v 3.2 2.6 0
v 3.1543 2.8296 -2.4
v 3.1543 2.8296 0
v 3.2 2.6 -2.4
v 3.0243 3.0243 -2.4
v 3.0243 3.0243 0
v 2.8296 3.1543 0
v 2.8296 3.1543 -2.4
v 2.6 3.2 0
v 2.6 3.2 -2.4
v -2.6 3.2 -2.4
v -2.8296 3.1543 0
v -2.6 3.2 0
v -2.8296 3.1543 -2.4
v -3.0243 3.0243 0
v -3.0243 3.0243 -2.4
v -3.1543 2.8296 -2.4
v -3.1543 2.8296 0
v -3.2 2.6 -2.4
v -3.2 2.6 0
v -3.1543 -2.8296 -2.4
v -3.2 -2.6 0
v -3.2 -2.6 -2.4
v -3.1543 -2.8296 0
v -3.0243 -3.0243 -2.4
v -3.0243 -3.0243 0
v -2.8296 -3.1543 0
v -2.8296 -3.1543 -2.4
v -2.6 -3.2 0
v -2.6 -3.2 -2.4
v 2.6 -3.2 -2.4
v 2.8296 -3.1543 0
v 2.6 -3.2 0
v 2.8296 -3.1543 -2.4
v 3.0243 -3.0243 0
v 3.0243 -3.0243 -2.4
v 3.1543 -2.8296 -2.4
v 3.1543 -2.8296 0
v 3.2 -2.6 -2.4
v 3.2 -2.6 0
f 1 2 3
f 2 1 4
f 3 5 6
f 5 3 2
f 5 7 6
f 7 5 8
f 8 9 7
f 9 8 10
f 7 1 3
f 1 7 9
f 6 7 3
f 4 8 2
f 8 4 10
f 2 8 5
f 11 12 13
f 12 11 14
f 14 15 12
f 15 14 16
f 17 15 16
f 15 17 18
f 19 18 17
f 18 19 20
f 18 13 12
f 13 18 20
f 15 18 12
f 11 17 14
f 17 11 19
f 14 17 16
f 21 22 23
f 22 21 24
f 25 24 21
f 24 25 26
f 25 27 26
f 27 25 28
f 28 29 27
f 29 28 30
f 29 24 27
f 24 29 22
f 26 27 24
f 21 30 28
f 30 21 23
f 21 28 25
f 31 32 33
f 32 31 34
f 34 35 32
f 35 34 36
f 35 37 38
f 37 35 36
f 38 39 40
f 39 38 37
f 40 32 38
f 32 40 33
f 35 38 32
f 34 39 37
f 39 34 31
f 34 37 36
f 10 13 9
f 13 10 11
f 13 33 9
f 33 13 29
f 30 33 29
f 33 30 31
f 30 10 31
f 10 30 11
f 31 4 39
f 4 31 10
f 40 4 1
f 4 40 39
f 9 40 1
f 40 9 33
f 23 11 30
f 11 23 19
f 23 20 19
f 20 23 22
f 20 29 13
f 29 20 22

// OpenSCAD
// file: ../p/1-4edge.scad
use <../lib.scad>
function ldraw_lib__1_4edge() = [
// 0 Circle 0.25
// 0 Name: 1-4edge.dat
// 0 Author: James Jessiman
// 0 !LDRAW_ORG Primitive UPDATE 2017-01
// 0 !LICENSE Licensed under CC BY 4.0 : see CAreadme.txt
// 
// 0 BFC CERTIFY CCW
  [0,"BFC","CERTIFY"],
  [0,"BFC","CCW"],
// 
// 0 !HISTORY 2007-06-22 [PTadmin] Header formatted for Contributor Agreement
// 0 !HISTORY 2008-07-01 [PTadmin] Official Update 2008-01
// 0 !HISTORY 2017-01-15 [Steffen] BFCed
// 0 !HISTORY 2017-12-30 [PTadmin] Official Update 2017-01
// 
// 
// 2 24 1 0 0 0.9239 0 0.3827
  [2,24,1,0,0,0.9239,0,0.3827],
// 2 24 0.9239 0 0.3827 0.7071 0 0.7071
  [2,24,0.9239,0,0.3827,0.7071,0,0.7071],
// 2 24 0.7071 0 0.7071 0.3827 0 0.9239
  [2,24,0.7071,0,0.7071,0.3827,0,0.9239],
// 2 24 0.3827 0 0.9239 0 0 1
  [2,24,0.3827,0,0.9239,0,0,1],
];
module ldraw_lib__1_4edge(step=0, col=false, unit=2/5, alt=false, line=0.2, solid=!$preview)
    makepoly(ldraw_lib__1_4edge(), step=step, col=col, unit=unit, alt=alt, line=line, solid=solid);
ldraw_lib__1_4edge(line=0.2);
// file: ../p/1-4cyli.scad
use <../lib.scad>
function ldraw_lib__1_4cyli() = [
// 0 Cylinder 0.25
// 0 Name: 1-4cyli.dat
// 0 Author: James Jessiman
// 0 !LDRAW_ORG Primitive UPDATE 2012-01
// 0 !LICENSE Licensed under CC BY 4.0 : see CAreadme.txt
// 
// 0 BFC CERTIFY CCW
  [0,"BFC","CERTIFY"],
  [0,"BFC","CCW"],
// 
// 0 !HISTORY 2002-03-23 [sbliss] Added BFC statement.
// 0 !HISTORY 2002-04-25 [PTadmin] Official Update 2002-02
// 0 !HISTORY 2007-06-22 [PTadmin] Header formatted for Contributor Agreement
// 0 !HISTORY 2008-07-01 [PTadmin] Official Update 2008-01
// 0 !HISTORY 2012-02-16 [Philo] Changed to CCW
// 0 !HISTORY 2012-03-30 [PTadmin] Official Update 2012-01
// 
// 
// 4 16 1 1 0 0.9239 1 0.3827 0.9239 0 0.3827 1 0 0
  [4,16,1,1,0,0.9239,1,0.3827,0.9239,0,0.3827,1,0,0],
// 5 24 1 0 0 1 1 0 0.9239 0 0.3827 1 0 -1
  [5,24,1,0,0,1,1,0,0.9239,0,0.3827,1,0,-1],
// 4 16 0.9239 1 0.3827 0.7071 1 0.7071 0.7071 0 0.7071 0.9239 0 0.3827
  [4,16,0.9239,1,0.3827,0.7071,1,0.7071,0.7071,0,0.7071,0.9239,0,0.3827],
// 5 24 0.9239 0 0.3827 0.9239 1 0.3827 0.7071 0 0.7071 1 0 0
  [5,24,0.9239,0,0.3827,0.9239,1,0.3827,0.7071,0,0.7071,1,0,0],
// 4 16 0.7071 1 0.7071 0.3827 1 0.9239 0.3827 0 0.9239 0.7071 0 0.7071
  [4,16,0.7071,1,0.7071,0.3827,1,0.9239,0.3827,0,0.9239,0.7071,0,0.7071],
// 5 24 0.7071 0 0.7071 0.7071 1 0.7071 0.3827 0 0.9239 0.9239 0 0.3827
  [5,24,0.7071,0,0.7071,0.7071,1,0.7071,0.3827,0,0.9239,0.9239,0,0.3827],
// 4 16 0.3827 1 0.9239 0 1 1 0 0 1 0.3827 0 0.9239
  [4,16,0.3827,1,0.9239,0,1,1,0,0,1,0.3827,0,0.9239],
// 5 24 0.3827 0 0.9239 0.3827 1 0.9239 0 0 1 0.7071 0 0.7071
  [5,24,0.3827,0,0.9239,0.3827,1,0.9239,0,0,1,0.7071,0,0.7071],
// 5 24 0 0 1 0 1 1 0.3827 0 0.9239 -1 0 1
  [5,24,0,0,1,0,1,1,0.3827,0,0.9239,-1,0,1],
];
module ldraw_lib__1_4cyli(step=0, col=false, unit=2/5, alt=false, line=0.2, solid=!$preview)
    makepoly(ldraw_lib__1_4cyli(), step=step, col=col, unit=unit, alt=alt, line=line, solid=solid);
ldraw_lib__1_4cyli(line=0.2);
// file: ../p/box4o8a.scad
use <../lib.scad>
function ldraw_lib__box4o8a() = [
// 0 Box with 4 Faces (2 Parallel Pairs) without Top and Bottom Edges
// 0 Name: box4o8a.dat
// 0 Author: Steffen [Steffen]
// 0 !LDRAW_ORG Primitive UPDATE 2012-01
// 0 !LICENSE Licensed under CC BY 4.0 : see CAreadme.txt
// 
// 0 BFC CERTIFY CCW
  [0,"BFC","CERTIFY"],
  [0,"BFC","CCW"],
// 
// 0 !HISTORY 2004-04-22 [PTadmin] Official Update 2004-02
// 0 !HISTORY 2007-06-24 [PTadmin] Header formatted for Contributor Agreement
// 0 !HISTORY 2008-07-01 [PTadmin] Official Update 2008-01
// 0 !HISTORY 2012-02-16 [Philo] Changed to CCW
// 0 !HISTORY 2012-03-30 [PTadmin] Official Update 2012-01
// 
// 
// 2 24 1 0 1 1 1 1
  [2,24,1,0,1,1,1,1],
// 2 24 -1 0 1 -1 1 1
  [2,24,-1,0,1,-1,1,1],
// 2 24 1 0 -1 1 1 -1
  [2,24,1,0,-1,1,1,-1],
// 2 24 -1 0 -1 -1 1 -1
  [2,24,-1,0,-1,-1,1,-1],
// 4 16 -1 1 1 -1 0 1 1 0 1 1 1 1
  [4,16,-1,1,1,-1,0,1,1,0,1,1,1,1],
// 4 16 -1 1 -1 -1 0 -1 -1 0 1 -1 1 1
  [4,16,-1,1,-1,-1,0,-1,-1,0,1,-1,1,1],
// 4 16 1 1 -1 1 0 -1 -1 0 -1 -1 1 -1
  [4,16,1,1,-1,1,0,-1,-1,0,-1,-1,1,-1],
// 4 16 1 1 1 1 0 1 1 0 -1 1 1 -1
  [4,16,1,1,1,1,0,1,1,0,-1,1,1,-1],
];
module ldraw_lib__box4o8a(step=0, col=false, unit=2/5, alt=false, line=0.2, solid=!$preview)
    makepoly(ldraw_lib__box4o8a(), step=step, col=col, unit=unit, alt=alt, line=line, solid=solid);
ldraw_lib__box4o8a(line=0.2);
// file: ../p/1-4cylo.scad
use <../lib.scad>
use <1-4cyli.scad>
use <1-4edge.scad>
function ldraw_lib__1_4cylo() = [
// 0 Cylinder Open 0.25
// 0 Name: 1-4cylo.dat
// 0 Author: Max Martin Richter [MMR1988]
// 0 !LDRAW_ORG Primitive UPDATE 2010-03
// 0 !LICENSE Licensed under CC BY 4.0 : see CAreadme.txt
// 
// 0 BFC CERTIFY CCW
  [0,"BFC","CERTIFY"],
  [0,"BFC","CCW"],
// 
// 0 !HISTORY 2010-12-31 [PTadmin] Official Update 2010-03
// 
// 
// 1 16 0 0 0 1 0 0 0 1 0 0 0 1 1-4edge.dat
  [1,16,0,0,0,1,0,0,0,1,0,0,0,1, ldraw_lib__1_4edge()],
// 1 16 0 1 0 1 0 0 0 1 0 0 0 1 1-4edge.dat
  [1,16,0,1,0,1,0,0,0,1,0,0,0,1, ldraw_lib__1_4edge()],
// 1 16 0 0 0 1 0 0 0 1 0 0 0 1 1-4cyli.dat
  [1,16,0,0,0,1,0,0,0,1,0,0,0,1, ldraw_lib__1_4cyli()],
];
module ldraw_lib__1_4cylo(step=0, col=false, unit=2/5, alt=false, line=0.2, solid=!$preview)
    makepoly(ldraw_lib__1_4cylo(), step=step, col=col, unit=unit, alt=alt, line=line, solid=solid);
ldraw_lib__1_4cylo(line=0.2);
// file: ../p/1-4chrd.scad
use <../lib.scad>
function ldraw_lib__1_4chrd() = [
// 0 Chord 0.25
// 0 Name: 1-4chrd.dat
// 0 Author: Tony Hafner [hafhead]
// 0 !LDRAW_ORG Primitive UPDATE 2012-02
// 0 !LICENSE Licensed under CC BY 2.0 and CC BY 4.0 : see CAreadme.txt
// 
// 0 BFC CERTIFY CCW
  [0,"BFC","CERTIFY"],
  [0,"BFC","CCW"],
// 
// 0 !HISTORY 2004-04-22 [PTadmin] Official Update 2004-02
// 0 !HISTORY 2007-10-09 [PTadmin] Header formatted for Contributor Agreement
// 0 !HISTORY 2008-07-01 [PTadmin] Official Update 2008-01
// 0 !HISTORY 2012-08-02 [MMR1988] Re-creation with PrimGen2 and Rectifier
// 0 !HISTORY 2012-08-09 [PTadmin] Official Update 2012-02
// 
// 
// 4 16 0.9239 0 0.3827 0.3827 0 0.9239 0 0 1 1 0 0
  [4,16,0.9239,0,0.3827,0.3827,0,0.9239,0,0,1,1,0,0],
// 3 16 0.7071 0 0.7071 0.3827 0 0.9239 0.9239 0 0.3827
  [3,16,0.7071,0,0.7071,0.3827,0,0.9239,0.9239,0,0.3827],
];
module ldraw_lib__1_4chrd(step=0, col=false, unit=2/5, alt=false, line=0.2, solid=!$preview)
    makepoly(ldraw_lib__1_4chrd(), step=step, col=col, unit=unit, alt=alt, line=line, solid=solid);
ldraw_lib__1_4chrd(line=0.2);
// main file
use <../lib.scad>
use <../p/1-4chrd.scad>
use <../p/1-4cylo.scad>
use <../p/box4o8a.scad>
function ldraw_lib__19068() = [
// 0 ~Electric Power Functions 2.0 Hub Button
// 0 Name: 19068.dat
// 0 Author: Philippe Hurbain [Philo]
// 0 !LDRAW_ORG Part UPDATE 2016-01
// 0 !LICENSE Licensed under CC BY 4.0 : see CAreadme.txt
// 
// 0 BFC CERTIFY CCW
  [0,"BFC","CERTIFY"],
  [0,"BFC","CCW"],
// 
// 0 !KEYWORDS WeDo 2.0
// 
// 0 !HISTORY 2016-12-31 [PTadmin] Official Update 2016-01
// 
// 
// 1 16 6.5 0 6.5 1.5 0 0 0 6 0 0 0 1.5 1-4cylo.dat
  [1,16,6.5,0,6.5,1.5,0,0,0,6,0,0,0,1.5, ldraw_lib__1_4cylo()],
// 1 16 6.5 0 6.5 1.5 0 0 0 1 0 0 0 1.5 1-4chrd.dat
  [1,16,6.5,0,6.5,1.5,0,0,0,1,0,0,0,1.5, ldraw_lib__1_4chrd()],
// 1 16 6.5 6 6.5 1.5 0 0 0 -1 0 0 0 1.5 1-4chrd.dat
  [1,16,6.5,6,6.5,1.5,0,0,0,-1,0,0,0,1.5, ldraw_lib__1_4chrd()],
// 1 16 -6.5 0 6.5 0 0 -1.5 0 6 0 1.5 0 0 1-4cylo.dat
  [1,16,-6.5,0,6.5,0,0,-1.5,0,6,0,1.5,0,0, ldraw_lib__1_4cylo()],
// 1 16 -6.5 0 6.5 0 0 -1.5 0 1 0 1.5 0 0 1-4chrd.dat
  [1,16,-6.5,0,6.5,0,0,-1.5,0,1,0,1.5,0,0, ldraw_lib__1_4chrd()],
// 1 16 -6.5 6 6.5 0 0 -1.5 0 -1 0 1.5 0 0 1-4chrd.dat
  [1,16,-6.5,6,6.5,0,0,-1.5,0,-1,0,1.5,0,0, ldraw_lib__1_4chrd()],
// 1 16 -6.5 0 -6.5 -1.5 0 0 0 6 0 0 0 -1.5 1-4cylo.dat
  [1,16,-6.5,0,-6.5,-1.5,0,0,0,6,0,0,0,-1.5, ldraw_lib__1_4cylo()],
// 1 16 -6.5 0 -6.5 -1.5 0 0 0 1 0 0 0 -1.5 1-4chrd.dat
  [1,16,-6.5,0,-6.5,-1.5,0,0,0,1,0,0,0,-1.5, ldraw_lib__1_4chrd()],
// 1 16 -6.5 6 -6.5 -1.5 0 0 0 -1 0 0 0 -1.5 1-4chrd.dat
  [1,16,-6.5,6,-6.5,-1.5,0,0,0,-1,0,0,0,-1.5, ldraw_lib__1_4chrd()],
// 1 16 6.5 0 -6.5 0 0 1.5 0 6 0 -1.5 0 0 1-4cylo.dat
  [1,16,6.5,0,-6.5,0,0,1.5,0,6,0,-1.5,0,0, ldraw_lib__1_4cylo()],
// 1 16 6.5 0 -6.5 0 0 1.5 0 1 0 -1.5 0 0 1-4chrd.dat
  [1,16,6.5,0,-6.5,0,0,1.5,0,1,0,-1.5,0,0, ldraw_lib__1_4chrd()],
// 1 16 6.5 6 -6.5 0 0 1.5 0 -1 0 -1.5 0 0 1-4chrd.dat
  [1,16,6.5,6,-6.5,0,0,1.5,0,-1,0,-1.5,0,0, ldraw_lib__1_4chrd()],
// 1 16 -6.5 3 0 0 13 0 3 0 0 0 0 8 box4o8a.dat
  [1,16,-6.5,3,0,0,13,0,3,0,0,0,0,8, ldraw_lib__box4o8a()],
// 4 16 6.5 6 8 8 6 6.5 8 6 -6.5 6.5 6 -8
  [4,16,6.5,6,8,8,6,6.5,8,6,-6.5,6.5,6,-8],
// 2 24 8 6 6.5 8 6 -6.5
  [2,24,8,6,6.5,8,6,-6.5],
// 4 16 8 6 -6.5 8 6 6.5 8 0 6.5 8 0 -6.5
  [4,16,8,6,-6.5,8,6,6.5,8,0,6.5,8,0,-6.5],
// 4 16 6.5 0 -8 8 0 -6.5 8 0 6.5 6.5 0 8
  [4,16,6.5,0,-8,8,0,-6.5,8,0,6.5,6.5,0,8],
// 2 24 8 0 6.5 8 0 -6.5
  [2,24,8,0,6.5,8,0,-6.5],
// 4 16 -6.5 6 -8 -8 6 -6.5 -8 6 6.5 -6.5 6 8
  [4,16,-6.5,6,-8,-8,6,-6.5,-8,6,6.5,-6.5,6,8],
// 2 24 -8 6 6.5 -8 6 -6.5
  [2,24,-8,6,6.5,-8,6,-6.5],
// 4 16 -8 0 -6.5 -8 0 6.5 -8 6 6.5 -8 6 -6.5
  [4,16,-8,0,-6.5,-8,0,6.5,-8,6,6.5,-8,6,-6.5],
// 4 16 -6.5 0 8 -8 0 6.5 -8 0 -6.5 -6.5 0 -8
  [4,16,-6.5,0,8,-8,0,6.5,-8,0,-6.5,-6.5,0,-8],
// 2 24 -8 0 6.5 -8 0 -6.5
  [2,24,-8,0,6.5,-8,0,-6.5],
];
module ldraw_lib__19068(step=0, col=false, unit=2/5, alt=false, line=0.2, solid=!$preview)
    makepoly(ldraw_lib__19068(), step=step, col=col, unit=unit, alt=alt, line=line, solid=solid);
ldraw_lib__19068(line=0.2);
